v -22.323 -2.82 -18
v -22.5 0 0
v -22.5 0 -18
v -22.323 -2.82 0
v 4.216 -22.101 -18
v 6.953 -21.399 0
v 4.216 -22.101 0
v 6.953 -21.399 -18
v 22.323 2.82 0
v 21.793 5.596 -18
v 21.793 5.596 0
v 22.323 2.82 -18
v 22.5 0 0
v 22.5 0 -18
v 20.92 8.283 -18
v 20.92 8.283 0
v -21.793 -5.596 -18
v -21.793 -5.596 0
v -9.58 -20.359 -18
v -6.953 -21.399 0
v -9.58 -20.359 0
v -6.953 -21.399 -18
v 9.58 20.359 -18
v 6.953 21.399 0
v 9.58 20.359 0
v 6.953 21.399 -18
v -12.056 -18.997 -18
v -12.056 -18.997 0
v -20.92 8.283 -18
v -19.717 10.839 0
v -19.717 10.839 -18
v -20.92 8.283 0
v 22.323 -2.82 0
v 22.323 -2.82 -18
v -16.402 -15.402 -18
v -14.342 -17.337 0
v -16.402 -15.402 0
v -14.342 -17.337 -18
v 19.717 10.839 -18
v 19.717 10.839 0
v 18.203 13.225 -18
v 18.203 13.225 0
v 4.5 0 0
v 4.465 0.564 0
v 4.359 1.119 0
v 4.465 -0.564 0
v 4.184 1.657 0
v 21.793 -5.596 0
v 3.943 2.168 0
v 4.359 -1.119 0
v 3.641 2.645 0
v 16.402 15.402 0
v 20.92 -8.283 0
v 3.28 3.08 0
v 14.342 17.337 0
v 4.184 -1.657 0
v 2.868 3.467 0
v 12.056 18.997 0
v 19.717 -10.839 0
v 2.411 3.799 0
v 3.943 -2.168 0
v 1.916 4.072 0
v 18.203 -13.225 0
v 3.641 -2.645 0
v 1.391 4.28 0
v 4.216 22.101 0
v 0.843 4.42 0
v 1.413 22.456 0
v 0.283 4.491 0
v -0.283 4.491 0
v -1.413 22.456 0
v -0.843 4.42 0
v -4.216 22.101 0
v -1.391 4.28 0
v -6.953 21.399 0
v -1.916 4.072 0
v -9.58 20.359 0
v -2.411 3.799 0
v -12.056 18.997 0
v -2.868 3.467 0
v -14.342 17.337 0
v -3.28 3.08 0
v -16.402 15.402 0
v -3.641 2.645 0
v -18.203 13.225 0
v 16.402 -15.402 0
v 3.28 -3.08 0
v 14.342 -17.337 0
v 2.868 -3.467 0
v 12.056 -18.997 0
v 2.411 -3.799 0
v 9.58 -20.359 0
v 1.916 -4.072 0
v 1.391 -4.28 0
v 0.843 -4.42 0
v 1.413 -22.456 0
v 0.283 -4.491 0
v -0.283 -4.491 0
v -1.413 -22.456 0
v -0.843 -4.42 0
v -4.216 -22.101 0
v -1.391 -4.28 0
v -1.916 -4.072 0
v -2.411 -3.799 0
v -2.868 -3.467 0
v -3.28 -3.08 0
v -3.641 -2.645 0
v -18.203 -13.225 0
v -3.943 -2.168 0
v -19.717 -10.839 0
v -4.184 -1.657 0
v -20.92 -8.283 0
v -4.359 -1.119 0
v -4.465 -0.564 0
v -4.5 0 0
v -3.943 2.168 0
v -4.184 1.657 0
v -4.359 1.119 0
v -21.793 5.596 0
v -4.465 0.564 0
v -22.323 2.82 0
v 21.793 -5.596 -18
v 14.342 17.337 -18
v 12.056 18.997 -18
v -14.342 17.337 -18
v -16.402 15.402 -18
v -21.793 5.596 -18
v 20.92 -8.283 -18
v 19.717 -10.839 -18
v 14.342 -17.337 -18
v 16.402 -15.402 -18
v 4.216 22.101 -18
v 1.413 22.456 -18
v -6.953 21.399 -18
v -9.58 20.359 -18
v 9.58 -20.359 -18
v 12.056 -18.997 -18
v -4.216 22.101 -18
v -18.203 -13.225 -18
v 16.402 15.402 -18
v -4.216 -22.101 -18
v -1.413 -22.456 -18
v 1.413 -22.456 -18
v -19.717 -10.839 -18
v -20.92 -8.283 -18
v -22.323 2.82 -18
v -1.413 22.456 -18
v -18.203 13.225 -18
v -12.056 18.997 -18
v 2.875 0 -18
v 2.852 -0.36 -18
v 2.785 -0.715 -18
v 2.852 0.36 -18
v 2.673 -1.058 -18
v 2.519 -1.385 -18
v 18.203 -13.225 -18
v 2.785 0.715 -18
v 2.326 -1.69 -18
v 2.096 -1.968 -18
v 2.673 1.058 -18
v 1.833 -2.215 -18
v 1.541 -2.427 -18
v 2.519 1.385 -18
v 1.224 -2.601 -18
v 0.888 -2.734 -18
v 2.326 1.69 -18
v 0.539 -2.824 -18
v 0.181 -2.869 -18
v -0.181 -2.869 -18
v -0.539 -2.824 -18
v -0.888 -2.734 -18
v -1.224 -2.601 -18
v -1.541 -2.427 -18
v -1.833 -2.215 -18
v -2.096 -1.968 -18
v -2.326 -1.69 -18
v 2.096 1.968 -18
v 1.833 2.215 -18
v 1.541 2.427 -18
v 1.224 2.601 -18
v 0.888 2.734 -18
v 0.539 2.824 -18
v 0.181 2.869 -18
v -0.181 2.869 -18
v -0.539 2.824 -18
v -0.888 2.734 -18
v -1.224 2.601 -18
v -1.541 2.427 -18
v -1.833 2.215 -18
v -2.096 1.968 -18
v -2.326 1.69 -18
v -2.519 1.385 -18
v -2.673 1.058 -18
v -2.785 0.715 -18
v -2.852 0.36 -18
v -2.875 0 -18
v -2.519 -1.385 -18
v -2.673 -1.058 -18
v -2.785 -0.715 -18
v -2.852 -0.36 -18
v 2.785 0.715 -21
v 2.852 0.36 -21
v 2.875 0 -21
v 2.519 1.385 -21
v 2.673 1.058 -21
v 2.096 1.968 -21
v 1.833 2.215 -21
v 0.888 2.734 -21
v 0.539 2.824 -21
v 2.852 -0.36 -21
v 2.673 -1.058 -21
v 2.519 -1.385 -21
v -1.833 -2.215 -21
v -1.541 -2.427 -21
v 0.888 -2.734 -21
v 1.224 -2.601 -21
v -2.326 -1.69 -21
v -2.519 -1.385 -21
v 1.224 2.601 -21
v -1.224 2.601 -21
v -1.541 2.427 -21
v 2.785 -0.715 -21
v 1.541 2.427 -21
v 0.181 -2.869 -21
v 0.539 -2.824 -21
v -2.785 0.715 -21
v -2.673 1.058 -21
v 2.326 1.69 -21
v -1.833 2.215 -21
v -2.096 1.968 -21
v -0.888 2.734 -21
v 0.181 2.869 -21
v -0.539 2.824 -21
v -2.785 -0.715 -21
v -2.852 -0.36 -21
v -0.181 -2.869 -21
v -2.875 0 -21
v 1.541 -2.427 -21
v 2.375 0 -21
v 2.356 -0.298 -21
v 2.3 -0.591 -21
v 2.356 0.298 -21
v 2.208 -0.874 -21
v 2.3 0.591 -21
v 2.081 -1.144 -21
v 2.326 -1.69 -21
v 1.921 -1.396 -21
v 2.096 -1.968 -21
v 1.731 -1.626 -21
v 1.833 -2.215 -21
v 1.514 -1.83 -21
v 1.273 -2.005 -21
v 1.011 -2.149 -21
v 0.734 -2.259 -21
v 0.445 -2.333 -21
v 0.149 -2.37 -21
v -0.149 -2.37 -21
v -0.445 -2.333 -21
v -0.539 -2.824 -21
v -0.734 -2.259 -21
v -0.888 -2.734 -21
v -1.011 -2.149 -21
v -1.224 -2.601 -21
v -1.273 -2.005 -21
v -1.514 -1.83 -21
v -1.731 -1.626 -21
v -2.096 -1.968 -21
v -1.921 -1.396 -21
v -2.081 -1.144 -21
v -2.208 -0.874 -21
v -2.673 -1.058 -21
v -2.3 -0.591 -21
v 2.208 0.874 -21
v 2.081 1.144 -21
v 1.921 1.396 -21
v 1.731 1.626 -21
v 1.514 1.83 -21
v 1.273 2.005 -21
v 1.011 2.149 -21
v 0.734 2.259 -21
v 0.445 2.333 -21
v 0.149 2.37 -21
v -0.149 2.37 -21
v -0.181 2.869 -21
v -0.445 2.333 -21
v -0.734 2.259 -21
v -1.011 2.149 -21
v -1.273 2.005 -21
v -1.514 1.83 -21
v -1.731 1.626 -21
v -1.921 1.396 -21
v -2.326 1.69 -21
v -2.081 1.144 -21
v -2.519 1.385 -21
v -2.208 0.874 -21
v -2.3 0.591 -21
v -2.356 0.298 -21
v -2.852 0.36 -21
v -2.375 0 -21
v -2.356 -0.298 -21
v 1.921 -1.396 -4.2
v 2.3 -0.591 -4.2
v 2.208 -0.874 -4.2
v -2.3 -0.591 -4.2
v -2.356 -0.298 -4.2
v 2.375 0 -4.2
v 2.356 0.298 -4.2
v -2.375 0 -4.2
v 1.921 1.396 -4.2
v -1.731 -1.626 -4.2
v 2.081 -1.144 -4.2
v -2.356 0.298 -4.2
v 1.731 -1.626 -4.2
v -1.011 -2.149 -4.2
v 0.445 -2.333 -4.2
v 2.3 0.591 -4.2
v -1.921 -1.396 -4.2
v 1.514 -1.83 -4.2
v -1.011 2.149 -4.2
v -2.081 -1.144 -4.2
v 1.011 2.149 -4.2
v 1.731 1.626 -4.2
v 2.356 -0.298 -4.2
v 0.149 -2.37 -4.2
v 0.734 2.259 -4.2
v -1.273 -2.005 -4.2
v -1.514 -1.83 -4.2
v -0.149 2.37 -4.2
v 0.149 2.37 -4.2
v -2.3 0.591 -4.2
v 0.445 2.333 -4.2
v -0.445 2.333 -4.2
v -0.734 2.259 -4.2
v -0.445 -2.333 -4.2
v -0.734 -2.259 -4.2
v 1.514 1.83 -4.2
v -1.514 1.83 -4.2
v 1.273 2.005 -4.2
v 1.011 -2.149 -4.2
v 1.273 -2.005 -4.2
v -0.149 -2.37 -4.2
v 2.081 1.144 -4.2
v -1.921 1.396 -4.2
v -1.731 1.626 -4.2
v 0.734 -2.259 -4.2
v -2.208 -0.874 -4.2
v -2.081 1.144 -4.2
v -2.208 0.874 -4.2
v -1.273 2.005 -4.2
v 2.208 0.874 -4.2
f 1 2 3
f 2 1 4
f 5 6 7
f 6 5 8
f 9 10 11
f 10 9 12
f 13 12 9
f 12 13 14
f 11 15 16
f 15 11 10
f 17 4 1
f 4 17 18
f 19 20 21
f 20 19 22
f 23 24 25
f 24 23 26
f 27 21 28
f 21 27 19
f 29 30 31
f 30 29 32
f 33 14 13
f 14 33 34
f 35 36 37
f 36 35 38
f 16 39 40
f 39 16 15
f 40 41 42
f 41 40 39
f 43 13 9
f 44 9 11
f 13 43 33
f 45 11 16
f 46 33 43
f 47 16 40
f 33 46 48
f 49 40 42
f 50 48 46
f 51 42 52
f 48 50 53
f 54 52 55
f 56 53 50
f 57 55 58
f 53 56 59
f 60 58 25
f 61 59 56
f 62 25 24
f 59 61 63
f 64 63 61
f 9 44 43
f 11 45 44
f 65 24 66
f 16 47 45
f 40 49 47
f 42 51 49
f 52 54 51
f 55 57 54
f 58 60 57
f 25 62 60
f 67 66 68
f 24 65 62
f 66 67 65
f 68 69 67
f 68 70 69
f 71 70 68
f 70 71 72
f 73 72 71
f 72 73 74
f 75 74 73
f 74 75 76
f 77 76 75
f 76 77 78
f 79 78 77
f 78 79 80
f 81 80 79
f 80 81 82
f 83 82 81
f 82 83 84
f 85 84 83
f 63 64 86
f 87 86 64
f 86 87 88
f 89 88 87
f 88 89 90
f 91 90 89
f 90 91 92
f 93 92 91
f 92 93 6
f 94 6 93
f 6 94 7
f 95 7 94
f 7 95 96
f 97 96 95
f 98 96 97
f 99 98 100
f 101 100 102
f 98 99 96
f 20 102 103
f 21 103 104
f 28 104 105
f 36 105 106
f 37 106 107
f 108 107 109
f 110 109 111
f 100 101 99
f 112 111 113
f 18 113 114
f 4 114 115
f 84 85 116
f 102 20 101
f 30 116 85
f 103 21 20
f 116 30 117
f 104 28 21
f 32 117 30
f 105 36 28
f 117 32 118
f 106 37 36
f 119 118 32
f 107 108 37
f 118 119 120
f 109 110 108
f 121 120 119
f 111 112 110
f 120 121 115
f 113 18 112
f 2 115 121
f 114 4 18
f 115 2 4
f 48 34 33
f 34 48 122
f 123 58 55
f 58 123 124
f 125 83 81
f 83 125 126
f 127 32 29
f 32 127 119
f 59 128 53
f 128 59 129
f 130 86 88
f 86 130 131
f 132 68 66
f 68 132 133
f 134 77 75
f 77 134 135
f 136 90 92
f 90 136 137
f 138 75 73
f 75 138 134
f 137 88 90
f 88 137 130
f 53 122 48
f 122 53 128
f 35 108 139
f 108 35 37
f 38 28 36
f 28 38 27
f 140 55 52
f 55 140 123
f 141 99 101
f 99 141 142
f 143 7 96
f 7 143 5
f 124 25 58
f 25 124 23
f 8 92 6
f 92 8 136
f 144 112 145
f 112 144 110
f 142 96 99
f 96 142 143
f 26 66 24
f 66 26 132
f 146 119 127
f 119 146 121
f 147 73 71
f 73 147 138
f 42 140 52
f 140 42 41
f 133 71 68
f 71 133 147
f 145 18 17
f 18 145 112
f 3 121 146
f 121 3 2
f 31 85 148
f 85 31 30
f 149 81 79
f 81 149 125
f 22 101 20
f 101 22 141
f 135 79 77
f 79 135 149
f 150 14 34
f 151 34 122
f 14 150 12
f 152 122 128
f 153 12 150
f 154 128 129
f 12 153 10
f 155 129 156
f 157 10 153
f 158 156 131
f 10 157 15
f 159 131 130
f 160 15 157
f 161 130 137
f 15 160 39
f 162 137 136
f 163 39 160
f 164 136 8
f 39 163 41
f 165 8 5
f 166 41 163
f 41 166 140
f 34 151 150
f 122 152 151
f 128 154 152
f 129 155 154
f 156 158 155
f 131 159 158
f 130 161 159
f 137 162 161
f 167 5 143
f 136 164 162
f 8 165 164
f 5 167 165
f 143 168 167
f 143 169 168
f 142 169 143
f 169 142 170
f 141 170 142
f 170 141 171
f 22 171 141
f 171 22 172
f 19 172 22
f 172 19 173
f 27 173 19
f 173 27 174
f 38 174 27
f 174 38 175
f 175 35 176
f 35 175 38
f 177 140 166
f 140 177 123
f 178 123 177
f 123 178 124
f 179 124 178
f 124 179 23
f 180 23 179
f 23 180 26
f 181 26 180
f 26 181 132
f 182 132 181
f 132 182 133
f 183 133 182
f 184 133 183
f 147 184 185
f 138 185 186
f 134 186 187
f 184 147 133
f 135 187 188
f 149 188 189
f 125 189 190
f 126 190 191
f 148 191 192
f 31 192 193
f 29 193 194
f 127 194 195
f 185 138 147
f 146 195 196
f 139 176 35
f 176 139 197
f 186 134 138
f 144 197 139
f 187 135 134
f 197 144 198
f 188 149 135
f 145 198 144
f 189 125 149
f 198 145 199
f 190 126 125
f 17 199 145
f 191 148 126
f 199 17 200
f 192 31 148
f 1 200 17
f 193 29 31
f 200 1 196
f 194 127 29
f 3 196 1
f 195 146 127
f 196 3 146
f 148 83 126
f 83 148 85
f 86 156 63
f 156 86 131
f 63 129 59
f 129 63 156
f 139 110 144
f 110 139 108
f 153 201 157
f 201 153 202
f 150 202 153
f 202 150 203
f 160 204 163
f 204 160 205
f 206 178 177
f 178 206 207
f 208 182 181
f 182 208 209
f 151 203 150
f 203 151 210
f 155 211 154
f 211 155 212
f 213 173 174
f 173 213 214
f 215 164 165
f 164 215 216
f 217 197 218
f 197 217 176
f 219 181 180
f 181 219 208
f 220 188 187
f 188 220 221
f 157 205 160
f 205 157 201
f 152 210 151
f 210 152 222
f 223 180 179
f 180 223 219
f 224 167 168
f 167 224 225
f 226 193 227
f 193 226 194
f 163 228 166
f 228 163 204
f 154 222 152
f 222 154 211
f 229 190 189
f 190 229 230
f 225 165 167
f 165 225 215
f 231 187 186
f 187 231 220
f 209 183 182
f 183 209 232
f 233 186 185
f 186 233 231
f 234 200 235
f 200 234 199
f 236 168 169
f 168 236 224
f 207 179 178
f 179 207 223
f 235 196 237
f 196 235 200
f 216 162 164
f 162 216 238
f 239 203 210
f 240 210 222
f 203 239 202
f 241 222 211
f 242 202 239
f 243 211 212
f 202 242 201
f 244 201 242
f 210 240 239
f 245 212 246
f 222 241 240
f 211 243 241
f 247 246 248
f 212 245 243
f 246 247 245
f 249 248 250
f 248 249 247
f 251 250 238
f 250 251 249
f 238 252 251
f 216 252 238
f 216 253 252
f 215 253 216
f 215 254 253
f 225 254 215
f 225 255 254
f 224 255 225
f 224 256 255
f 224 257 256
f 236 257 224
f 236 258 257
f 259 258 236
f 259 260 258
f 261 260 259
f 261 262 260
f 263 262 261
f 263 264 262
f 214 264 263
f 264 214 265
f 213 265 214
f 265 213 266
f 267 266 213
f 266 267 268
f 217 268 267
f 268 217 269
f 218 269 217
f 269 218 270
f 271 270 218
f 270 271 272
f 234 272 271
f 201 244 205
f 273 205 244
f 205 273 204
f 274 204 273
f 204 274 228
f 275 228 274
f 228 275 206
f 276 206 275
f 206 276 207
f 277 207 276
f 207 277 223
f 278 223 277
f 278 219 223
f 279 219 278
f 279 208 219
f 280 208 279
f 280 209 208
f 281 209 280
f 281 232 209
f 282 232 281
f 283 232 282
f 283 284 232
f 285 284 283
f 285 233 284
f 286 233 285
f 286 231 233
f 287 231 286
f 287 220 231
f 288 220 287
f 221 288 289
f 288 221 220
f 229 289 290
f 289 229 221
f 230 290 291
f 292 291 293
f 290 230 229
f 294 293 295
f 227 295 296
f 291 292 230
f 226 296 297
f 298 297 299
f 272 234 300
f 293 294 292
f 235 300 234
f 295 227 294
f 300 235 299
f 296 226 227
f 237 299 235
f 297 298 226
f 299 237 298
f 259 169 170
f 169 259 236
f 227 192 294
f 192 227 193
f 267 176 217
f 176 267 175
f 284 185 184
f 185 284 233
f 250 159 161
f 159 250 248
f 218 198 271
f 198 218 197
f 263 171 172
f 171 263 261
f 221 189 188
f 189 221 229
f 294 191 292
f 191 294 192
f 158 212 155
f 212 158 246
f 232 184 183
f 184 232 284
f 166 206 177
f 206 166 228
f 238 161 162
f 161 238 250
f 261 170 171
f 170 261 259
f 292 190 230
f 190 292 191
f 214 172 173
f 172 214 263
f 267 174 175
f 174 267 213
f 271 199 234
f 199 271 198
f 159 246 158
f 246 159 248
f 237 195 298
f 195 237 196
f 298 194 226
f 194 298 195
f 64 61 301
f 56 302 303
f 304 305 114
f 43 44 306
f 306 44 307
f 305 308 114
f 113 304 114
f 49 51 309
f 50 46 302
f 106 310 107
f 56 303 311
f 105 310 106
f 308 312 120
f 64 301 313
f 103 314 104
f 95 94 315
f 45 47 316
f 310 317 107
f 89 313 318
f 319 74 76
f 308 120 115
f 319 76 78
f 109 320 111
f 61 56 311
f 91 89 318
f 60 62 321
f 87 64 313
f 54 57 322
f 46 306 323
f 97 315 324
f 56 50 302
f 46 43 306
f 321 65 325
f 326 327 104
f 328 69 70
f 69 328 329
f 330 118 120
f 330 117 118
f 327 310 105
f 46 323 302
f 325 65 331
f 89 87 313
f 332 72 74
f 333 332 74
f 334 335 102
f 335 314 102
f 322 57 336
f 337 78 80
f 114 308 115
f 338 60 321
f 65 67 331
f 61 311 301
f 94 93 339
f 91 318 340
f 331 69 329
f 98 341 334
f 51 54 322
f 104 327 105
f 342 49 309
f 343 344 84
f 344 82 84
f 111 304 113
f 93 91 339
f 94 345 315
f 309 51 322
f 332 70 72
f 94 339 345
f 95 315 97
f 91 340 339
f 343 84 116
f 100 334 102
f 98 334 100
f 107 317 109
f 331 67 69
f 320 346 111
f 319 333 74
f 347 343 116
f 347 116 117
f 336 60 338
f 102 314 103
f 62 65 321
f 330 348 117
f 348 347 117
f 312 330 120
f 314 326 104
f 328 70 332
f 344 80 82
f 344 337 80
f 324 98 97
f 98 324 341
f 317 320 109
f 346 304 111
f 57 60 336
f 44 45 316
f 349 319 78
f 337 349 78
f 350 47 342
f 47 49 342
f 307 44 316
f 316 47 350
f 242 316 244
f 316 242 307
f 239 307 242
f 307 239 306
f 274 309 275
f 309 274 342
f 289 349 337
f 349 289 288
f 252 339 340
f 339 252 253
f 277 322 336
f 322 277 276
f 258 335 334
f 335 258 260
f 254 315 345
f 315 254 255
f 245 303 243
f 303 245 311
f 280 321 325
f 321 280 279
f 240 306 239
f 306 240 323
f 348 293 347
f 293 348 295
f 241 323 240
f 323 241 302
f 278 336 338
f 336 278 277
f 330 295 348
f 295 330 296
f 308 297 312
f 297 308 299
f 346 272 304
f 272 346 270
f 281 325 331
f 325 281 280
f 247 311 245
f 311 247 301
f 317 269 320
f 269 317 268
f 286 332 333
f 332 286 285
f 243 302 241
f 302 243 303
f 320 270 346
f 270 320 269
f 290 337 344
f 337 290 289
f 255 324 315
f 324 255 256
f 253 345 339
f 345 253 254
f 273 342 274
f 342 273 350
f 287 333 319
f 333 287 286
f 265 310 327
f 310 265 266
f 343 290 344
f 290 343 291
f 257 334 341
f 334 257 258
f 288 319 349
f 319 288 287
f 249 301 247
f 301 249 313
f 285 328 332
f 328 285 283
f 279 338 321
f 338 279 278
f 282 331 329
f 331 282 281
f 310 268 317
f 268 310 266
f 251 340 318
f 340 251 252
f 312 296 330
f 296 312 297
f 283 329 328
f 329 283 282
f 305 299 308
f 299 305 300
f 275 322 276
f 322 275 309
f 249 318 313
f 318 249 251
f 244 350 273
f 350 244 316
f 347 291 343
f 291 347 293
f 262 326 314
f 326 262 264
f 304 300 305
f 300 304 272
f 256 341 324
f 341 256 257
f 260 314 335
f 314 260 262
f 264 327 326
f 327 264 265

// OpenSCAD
$fn = 50;

difference() {
	union() {
		translate(v = [0, 0, -18.0]) {
			cylinder(h = 18, r = 22.5);
		}
		#translate(v = [0, 0, -21.0]) {
			cylinder(h = 21, r = 2.875);
		}
	}
	union() {
		translate(v = [0, 0, 0]) {
			rotate(a = [0, 0, 0]) {
				difference() {
					union() {
						translate(v = [0, 0, -21.0]) {
							cylinder(h = 21, r = 2.25);
						}
						translate(v = [0, 0, -4.2]) {
							cylinder(h = 4.2, r1 = 2.375, r2 = 4.5);
						}
						translate(v = [0, 0, -21.0]) {
							cylinder(h = 21, r = 2.375);
						}
						translate(v = [0, 0, -21.0]) {
							cylinder(h = 21, r = 2.25);
						}
					}
					union();
				}
			}
		}
	}
}
